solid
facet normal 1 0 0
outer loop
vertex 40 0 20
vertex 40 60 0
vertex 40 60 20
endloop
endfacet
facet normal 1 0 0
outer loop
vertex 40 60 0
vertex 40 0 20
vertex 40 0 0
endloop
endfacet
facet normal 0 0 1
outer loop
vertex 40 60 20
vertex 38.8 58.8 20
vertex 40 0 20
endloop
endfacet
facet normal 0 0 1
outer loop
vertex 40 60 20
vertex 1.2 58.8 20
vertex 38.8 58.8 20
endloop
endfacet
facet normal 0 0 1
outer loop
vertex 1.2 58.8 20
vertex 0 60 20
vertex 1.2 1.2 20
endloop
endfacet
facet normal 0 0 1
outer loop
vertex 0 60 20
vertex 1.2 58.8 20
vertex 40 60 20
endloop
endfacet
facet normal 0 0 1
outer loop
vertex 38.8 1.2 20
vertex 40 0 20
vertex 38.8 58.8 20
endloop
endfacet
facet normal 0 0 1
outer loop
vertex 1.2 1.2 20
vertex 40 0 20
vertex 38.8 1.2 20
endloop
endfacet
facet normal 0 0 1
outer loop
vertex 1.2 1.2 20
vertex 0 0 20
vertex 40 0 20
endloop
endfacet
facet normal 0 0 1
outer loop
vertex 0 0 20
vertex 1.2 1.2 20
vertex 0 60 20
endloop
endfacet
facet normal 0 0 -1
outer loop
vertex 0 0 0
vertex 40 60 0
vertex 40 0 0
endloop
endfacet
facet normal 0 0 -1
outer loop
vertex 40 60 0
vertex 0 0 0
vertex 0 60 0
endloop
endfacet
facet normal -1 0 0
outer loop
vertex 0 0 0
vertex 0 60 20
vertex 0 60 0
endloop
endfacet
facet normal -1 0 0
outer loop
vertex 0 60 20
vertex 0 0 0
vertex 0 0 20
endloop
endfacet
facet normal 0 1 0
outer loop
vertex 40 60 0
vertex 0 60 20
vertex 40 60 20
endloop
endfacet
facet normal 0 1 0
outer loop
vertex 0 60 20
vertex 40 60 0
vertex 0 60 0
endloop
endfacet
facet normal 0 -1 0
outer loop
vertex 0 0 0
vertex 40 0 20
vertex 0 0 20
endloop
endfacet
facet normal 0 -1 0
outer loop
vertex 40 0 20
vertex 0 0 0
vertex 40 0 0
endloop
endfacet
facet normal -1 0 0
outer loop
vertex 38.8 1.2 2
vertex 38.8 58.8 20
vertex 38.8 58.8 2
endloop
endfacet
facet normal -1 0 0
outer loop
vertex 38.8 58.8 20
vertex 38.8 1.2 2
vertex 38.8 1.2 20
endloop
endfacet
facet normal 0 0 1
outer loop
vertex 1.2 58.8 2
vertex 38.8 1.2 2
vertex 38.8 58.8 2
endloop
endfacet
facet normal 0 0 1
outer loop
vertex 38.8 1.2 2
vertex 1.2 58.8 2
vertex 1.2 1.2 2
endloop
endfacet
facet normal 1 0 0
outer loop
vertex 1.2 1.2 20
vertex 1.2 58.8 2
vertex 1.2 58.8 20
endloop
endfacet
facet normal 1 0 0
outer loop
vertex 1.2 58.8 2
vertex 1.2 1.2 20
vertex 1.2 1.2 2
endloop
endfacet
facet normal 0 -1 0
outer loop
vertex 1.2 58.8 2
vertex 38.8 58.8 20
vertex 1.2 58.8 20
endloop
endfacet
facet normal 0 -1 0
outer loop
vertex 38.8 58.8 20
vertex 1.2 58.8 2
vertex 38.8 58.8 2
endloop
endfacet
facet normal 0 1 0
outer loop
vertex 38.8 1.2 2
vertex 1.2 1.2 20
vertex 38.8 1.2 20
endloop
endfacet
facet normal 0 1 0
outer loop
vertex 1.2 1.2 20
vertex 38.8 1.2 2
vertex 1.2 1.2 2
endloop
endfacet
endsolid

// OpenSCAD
$fn = 32;

// ----------------------------------------------------------------------
// Open box: 1.2 mm walls
// ----------------------------------------------------------------------

// --- parameters (mm) ---
box_l = 40;               // outer length, X
box_w = 60;               // outer width, Y
box_h = 20;               // outer height, Z
wall = 1.2;               // wall thickness
floor = 2;                // floor thickness

difference() {
  cube([box_l, box_w, box_h]);
  translate([wall, wall, floor])
    cube([box_l - 2 * wall, box_w - 2 * wall, box_h]);
}
